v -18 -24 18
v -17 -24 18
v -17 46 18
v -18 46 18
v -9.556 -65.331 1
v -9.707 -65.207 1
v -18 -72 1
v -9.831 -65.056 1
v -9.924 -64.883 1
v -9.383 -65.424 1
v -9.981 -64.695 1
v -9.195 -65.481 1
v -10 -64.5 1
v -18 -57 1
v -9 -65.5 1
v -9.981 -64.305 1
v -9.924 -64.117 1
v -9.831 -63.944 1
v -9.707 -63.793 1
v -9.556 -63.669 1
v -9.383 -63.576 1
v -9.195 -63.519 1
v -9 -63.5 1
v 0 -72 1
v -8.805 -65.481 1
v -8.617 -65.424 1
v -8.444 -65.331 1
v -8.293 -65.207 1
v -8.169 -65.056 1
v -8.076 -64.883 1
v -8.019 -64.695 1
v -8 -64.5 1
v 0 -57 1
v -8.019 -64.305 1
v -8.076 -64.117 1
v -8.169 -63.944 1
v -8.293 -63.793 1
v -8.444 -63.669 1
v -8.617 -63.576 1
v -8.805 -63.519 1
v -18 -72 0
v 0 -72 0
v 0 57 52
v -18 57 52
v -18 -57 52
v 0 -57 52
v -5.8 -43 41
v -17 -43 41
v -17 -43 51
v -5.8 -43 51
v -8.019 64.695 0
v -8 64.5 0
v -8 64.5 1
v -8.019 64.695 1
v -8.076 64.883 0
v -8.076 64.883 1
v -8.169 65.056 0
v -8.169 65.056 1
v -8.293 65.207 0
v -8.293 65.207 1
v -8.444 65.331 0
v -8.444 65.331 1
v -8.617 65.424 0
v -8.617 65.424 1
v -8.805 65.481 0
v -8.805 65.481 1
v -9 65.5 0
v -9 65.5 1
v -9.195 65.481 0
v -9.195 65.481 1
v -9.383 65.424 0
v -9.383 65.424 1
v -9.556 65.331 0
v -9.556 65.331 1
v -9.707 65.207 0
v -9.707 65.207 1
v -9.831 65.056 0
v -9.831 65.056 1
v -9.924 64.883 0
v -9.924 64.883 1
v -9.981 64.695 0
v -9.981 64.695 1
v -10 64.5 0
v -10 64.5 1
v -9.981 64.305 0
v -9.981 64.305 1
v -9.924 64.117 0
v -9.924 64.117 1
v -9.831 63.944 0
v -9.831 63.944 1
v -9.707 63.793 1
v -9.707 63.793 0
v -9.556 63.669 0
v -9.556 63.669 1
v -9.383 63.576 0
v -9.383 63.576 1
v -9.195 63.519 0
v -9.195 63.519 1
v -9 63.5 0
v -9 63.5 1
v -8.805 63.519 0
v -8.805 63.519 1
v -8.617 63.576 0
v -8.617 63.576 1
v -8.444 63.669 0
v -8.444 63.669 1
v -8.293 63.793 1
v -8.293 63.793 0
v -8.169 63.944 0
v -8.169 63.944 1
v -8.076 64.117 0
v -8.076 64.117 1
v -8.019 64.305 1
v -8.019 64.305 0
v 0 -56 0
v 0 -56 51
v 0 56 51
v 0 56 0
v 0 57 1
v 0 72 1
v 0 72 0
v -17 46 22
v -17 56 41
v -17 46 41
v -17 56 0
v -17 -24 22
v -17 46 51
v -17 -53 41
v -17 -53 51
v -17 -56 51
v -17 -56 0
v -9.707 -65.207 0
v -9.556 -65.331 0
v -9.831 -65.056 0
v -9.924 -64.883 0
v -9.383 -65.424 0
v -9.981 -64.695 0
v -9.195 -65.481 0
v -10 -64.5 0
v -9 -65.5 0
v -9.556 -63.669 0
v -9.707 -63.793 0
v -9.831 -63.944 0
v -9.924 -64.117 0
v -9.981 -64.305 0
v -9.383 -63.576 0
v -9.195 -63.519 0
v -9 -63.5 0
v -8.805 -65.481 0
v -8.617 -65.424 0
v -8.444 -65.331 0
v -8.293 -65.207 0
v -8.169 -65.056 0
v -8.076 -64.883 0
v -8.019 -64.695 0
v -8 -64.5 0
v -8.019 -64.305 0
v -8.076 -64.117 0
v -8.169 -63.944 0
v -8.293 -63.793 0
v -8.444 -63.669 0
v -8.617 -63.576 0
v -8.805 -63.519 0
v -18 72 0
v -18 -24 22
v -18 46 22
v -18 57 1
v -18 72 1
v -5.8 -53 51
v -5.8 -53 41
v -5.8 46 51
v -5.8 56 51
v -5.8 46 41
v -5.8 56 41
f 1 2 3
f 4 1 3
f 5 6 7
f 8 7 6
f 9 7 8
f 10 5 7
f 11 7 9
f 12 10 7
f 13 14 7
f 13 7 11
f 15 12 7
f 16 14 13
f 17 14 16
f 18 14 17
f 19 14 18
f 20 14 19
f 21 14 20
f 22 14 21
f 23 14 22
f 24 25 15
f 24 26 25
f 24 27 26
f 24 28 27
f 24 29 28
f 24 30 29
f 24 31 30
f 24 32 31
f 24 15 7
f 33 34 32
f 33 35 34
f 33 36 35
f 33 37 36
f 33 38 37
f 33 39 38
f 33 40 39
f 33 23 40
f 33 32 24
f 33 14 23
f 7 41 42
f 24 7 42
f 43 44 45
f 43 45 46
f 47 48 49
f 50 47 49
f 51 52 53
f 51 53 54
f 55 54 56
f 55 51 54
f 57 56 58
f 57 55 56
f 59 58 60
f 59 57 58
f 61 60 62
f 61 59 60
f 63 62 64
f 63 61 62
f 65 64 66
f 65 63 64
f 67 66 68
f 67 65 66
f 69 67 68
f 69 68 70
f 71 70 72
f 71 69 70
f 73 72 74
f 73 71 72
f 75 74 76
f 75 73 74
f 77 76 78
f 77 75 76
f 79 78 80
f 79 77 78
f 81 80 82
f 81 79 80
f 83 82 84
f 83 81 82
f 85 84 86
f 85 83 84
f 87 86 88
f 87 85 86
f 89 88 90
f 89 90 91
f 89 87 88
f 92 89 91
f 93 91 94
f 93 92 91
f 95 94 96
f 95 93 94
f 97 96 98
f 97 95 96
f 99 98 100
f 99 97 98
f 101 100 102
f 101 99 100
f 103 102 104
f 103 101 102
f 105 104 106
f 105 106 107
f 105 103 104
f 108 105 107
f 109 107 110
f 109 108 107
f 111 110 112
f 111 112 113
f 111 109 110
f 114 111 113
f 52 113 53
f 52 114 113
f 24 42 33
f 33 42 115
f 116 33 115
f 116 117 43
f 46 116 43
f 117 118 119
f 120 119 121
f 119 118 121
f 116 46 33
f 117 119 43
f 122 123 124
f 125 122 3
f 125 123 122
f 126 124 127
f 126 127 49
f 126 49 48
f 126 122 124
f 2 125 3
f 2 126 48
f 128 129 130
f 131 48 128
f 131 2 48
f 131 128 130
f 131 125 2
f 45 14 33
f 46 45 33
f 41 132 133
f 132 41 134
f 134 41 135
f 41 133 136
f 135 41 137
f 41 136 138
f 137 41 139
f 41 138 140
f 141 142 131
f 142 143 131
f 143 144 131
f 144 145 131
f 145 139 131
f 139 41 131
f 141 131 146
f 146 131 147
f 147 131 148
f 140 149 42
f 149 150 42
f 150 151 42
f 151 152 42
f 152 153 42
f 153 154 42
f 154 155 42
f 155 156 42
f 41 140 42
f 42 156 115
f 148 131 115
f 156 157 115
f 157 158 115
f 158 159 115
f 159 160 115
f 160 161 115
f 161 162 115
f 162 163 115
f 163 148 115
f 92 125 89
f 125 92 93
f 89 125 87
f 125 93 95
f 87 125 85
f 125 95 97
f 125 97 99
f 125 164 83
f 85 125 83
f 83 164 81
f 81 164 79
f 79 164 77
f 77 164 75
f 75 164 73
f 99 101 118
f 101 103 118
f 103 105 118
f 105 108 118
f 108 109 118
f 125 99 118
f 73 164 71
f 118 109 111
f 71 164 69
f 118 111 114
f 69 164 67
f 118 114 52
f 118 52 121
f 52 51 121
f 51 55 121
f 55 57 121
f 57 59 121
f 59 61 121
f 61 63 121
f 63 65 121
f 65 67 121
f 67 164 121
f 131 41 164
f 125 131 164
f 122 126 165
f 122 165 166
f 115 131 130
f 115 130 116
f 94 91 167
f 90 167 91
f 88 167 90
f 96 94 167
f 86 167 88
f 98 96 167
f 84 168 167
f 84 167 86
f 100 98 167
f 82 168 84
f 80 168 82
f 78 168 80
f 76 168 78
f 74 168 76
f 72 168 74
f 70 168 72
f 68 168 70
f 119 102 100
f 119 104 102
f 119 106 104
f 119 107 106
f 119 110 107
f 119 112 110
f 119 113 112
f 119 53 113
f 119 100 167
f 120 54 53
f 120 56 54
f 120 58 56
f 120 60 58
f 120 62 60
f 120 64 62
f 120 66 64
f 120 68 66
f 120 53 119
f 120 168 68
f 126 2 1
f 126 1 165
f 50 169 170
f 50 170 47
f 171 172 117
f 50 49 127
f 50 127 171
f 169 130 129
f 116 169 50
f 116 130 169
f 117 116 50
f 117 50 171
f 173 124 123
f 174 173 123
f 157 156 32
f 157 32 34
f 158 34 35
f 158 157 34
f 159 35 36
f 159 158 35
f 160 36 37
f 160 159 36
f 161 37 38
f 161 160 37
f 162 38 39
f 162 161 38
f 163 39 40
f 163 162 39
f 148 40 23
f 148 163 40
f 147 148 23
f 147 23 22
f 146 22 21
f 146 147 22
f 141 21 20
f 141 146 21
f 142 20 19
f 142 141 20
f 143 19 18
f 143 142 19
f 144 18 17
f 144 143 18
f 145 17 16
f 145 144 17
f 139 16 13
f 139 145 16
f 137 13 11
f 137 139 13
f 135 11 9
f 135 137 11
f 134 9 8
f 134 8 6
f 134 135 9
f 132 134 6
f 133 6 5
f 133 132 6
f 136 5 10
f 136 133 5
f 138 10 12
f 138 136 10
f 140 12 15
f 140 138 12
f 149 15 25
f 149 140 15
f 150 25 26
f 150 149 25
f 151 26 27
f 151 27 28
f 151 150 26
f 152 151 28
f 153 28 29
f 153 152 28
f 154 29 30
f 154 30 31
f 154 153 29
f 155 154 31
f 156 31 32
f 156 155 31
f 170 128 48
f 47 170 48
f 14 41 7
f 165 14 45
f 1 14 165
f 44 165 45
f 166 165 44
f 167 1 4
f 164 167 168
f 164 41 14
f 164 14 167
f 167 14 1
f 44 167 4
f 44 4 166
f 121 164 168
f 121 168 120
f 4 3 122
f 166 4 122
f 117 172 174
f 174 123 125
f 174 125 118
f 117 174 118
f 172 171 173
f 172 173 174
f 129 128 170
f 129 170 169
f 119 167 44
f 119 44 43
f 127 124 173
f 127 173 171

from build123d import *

# Parameters (mm, degrees)
F0_W     = 18
F0_H     = 114
F1_DEPTH = 52
F2_W     = 17
F2_H     = 112
F3_DEPTH = 51
F4_W     = 18
F4_H     = 15
F4_R     = 1
F5_DEPTH = 1
F6_W     = 70
F6_H     = 4
F7_DEPTH = 1
F8_W     = 10
F8_H     = 10
F9_DEPTH = 11.2


with BuildPart() as f1:
    # F0 (on Top) → F1 (new body)
    with BuildSketch(Plane.XY):
        with Locations((-9, 0)):
            Rectangle(F0_W, F0_H)
    extrude(amount=F1_DEPTH)

    # F2 (on face) → F3 (cut)
    with BuildSketch(Plane(origin=(0, 0, 0), x_dir=(1, 0, 0), z_dir=(0, 0, -1))):
        with Locations((-8.5, 0)):
            Rectangle(F2_W, F2_H)
    extrude(amount=-F3_DEPTH, mode=Mode.SUBTRACT)

    # F4 (on Top) → F5 (join)
    with BuildSketch(Plane.XY):
        with Locations((-9, 64.5)):
            Rectangle(F4_W, F4_H)
        with Locations((-9, 64.5)):
            Circle(F4_R, mode=Mode.SUBTRACT)
        with Locations((-9, -64.5)):
            Rectangle(F4_W, F4_H)
        with Locations((-9, -64.5)):
            Circle(F4_R, mode=Mode.SUBTRACT)
    extrude(amount=F5_DEPTH)

    # F6 (on face) → F7 (cut)
    with BuildSketch(Plane.YZ.offset(-17)):
        with Locations((11, 20)):
            Rectangle(F6_W, F6_H)
    extrude(amount=-F7_DEPTH, mode=Mode.SUBTRACT)

    # F8 (on face) → F9 (join)
    with BuildSketch(Plane.YZ.offset(-17)):
        with Locations((-48, 46)):
            Rectangle(F8_W, F8_H)
        with Locations((51, 46)):
            Rectangle(F8_W, F8_H)
    extrude(amount=F9_DEPTH)


solid = f1.part
